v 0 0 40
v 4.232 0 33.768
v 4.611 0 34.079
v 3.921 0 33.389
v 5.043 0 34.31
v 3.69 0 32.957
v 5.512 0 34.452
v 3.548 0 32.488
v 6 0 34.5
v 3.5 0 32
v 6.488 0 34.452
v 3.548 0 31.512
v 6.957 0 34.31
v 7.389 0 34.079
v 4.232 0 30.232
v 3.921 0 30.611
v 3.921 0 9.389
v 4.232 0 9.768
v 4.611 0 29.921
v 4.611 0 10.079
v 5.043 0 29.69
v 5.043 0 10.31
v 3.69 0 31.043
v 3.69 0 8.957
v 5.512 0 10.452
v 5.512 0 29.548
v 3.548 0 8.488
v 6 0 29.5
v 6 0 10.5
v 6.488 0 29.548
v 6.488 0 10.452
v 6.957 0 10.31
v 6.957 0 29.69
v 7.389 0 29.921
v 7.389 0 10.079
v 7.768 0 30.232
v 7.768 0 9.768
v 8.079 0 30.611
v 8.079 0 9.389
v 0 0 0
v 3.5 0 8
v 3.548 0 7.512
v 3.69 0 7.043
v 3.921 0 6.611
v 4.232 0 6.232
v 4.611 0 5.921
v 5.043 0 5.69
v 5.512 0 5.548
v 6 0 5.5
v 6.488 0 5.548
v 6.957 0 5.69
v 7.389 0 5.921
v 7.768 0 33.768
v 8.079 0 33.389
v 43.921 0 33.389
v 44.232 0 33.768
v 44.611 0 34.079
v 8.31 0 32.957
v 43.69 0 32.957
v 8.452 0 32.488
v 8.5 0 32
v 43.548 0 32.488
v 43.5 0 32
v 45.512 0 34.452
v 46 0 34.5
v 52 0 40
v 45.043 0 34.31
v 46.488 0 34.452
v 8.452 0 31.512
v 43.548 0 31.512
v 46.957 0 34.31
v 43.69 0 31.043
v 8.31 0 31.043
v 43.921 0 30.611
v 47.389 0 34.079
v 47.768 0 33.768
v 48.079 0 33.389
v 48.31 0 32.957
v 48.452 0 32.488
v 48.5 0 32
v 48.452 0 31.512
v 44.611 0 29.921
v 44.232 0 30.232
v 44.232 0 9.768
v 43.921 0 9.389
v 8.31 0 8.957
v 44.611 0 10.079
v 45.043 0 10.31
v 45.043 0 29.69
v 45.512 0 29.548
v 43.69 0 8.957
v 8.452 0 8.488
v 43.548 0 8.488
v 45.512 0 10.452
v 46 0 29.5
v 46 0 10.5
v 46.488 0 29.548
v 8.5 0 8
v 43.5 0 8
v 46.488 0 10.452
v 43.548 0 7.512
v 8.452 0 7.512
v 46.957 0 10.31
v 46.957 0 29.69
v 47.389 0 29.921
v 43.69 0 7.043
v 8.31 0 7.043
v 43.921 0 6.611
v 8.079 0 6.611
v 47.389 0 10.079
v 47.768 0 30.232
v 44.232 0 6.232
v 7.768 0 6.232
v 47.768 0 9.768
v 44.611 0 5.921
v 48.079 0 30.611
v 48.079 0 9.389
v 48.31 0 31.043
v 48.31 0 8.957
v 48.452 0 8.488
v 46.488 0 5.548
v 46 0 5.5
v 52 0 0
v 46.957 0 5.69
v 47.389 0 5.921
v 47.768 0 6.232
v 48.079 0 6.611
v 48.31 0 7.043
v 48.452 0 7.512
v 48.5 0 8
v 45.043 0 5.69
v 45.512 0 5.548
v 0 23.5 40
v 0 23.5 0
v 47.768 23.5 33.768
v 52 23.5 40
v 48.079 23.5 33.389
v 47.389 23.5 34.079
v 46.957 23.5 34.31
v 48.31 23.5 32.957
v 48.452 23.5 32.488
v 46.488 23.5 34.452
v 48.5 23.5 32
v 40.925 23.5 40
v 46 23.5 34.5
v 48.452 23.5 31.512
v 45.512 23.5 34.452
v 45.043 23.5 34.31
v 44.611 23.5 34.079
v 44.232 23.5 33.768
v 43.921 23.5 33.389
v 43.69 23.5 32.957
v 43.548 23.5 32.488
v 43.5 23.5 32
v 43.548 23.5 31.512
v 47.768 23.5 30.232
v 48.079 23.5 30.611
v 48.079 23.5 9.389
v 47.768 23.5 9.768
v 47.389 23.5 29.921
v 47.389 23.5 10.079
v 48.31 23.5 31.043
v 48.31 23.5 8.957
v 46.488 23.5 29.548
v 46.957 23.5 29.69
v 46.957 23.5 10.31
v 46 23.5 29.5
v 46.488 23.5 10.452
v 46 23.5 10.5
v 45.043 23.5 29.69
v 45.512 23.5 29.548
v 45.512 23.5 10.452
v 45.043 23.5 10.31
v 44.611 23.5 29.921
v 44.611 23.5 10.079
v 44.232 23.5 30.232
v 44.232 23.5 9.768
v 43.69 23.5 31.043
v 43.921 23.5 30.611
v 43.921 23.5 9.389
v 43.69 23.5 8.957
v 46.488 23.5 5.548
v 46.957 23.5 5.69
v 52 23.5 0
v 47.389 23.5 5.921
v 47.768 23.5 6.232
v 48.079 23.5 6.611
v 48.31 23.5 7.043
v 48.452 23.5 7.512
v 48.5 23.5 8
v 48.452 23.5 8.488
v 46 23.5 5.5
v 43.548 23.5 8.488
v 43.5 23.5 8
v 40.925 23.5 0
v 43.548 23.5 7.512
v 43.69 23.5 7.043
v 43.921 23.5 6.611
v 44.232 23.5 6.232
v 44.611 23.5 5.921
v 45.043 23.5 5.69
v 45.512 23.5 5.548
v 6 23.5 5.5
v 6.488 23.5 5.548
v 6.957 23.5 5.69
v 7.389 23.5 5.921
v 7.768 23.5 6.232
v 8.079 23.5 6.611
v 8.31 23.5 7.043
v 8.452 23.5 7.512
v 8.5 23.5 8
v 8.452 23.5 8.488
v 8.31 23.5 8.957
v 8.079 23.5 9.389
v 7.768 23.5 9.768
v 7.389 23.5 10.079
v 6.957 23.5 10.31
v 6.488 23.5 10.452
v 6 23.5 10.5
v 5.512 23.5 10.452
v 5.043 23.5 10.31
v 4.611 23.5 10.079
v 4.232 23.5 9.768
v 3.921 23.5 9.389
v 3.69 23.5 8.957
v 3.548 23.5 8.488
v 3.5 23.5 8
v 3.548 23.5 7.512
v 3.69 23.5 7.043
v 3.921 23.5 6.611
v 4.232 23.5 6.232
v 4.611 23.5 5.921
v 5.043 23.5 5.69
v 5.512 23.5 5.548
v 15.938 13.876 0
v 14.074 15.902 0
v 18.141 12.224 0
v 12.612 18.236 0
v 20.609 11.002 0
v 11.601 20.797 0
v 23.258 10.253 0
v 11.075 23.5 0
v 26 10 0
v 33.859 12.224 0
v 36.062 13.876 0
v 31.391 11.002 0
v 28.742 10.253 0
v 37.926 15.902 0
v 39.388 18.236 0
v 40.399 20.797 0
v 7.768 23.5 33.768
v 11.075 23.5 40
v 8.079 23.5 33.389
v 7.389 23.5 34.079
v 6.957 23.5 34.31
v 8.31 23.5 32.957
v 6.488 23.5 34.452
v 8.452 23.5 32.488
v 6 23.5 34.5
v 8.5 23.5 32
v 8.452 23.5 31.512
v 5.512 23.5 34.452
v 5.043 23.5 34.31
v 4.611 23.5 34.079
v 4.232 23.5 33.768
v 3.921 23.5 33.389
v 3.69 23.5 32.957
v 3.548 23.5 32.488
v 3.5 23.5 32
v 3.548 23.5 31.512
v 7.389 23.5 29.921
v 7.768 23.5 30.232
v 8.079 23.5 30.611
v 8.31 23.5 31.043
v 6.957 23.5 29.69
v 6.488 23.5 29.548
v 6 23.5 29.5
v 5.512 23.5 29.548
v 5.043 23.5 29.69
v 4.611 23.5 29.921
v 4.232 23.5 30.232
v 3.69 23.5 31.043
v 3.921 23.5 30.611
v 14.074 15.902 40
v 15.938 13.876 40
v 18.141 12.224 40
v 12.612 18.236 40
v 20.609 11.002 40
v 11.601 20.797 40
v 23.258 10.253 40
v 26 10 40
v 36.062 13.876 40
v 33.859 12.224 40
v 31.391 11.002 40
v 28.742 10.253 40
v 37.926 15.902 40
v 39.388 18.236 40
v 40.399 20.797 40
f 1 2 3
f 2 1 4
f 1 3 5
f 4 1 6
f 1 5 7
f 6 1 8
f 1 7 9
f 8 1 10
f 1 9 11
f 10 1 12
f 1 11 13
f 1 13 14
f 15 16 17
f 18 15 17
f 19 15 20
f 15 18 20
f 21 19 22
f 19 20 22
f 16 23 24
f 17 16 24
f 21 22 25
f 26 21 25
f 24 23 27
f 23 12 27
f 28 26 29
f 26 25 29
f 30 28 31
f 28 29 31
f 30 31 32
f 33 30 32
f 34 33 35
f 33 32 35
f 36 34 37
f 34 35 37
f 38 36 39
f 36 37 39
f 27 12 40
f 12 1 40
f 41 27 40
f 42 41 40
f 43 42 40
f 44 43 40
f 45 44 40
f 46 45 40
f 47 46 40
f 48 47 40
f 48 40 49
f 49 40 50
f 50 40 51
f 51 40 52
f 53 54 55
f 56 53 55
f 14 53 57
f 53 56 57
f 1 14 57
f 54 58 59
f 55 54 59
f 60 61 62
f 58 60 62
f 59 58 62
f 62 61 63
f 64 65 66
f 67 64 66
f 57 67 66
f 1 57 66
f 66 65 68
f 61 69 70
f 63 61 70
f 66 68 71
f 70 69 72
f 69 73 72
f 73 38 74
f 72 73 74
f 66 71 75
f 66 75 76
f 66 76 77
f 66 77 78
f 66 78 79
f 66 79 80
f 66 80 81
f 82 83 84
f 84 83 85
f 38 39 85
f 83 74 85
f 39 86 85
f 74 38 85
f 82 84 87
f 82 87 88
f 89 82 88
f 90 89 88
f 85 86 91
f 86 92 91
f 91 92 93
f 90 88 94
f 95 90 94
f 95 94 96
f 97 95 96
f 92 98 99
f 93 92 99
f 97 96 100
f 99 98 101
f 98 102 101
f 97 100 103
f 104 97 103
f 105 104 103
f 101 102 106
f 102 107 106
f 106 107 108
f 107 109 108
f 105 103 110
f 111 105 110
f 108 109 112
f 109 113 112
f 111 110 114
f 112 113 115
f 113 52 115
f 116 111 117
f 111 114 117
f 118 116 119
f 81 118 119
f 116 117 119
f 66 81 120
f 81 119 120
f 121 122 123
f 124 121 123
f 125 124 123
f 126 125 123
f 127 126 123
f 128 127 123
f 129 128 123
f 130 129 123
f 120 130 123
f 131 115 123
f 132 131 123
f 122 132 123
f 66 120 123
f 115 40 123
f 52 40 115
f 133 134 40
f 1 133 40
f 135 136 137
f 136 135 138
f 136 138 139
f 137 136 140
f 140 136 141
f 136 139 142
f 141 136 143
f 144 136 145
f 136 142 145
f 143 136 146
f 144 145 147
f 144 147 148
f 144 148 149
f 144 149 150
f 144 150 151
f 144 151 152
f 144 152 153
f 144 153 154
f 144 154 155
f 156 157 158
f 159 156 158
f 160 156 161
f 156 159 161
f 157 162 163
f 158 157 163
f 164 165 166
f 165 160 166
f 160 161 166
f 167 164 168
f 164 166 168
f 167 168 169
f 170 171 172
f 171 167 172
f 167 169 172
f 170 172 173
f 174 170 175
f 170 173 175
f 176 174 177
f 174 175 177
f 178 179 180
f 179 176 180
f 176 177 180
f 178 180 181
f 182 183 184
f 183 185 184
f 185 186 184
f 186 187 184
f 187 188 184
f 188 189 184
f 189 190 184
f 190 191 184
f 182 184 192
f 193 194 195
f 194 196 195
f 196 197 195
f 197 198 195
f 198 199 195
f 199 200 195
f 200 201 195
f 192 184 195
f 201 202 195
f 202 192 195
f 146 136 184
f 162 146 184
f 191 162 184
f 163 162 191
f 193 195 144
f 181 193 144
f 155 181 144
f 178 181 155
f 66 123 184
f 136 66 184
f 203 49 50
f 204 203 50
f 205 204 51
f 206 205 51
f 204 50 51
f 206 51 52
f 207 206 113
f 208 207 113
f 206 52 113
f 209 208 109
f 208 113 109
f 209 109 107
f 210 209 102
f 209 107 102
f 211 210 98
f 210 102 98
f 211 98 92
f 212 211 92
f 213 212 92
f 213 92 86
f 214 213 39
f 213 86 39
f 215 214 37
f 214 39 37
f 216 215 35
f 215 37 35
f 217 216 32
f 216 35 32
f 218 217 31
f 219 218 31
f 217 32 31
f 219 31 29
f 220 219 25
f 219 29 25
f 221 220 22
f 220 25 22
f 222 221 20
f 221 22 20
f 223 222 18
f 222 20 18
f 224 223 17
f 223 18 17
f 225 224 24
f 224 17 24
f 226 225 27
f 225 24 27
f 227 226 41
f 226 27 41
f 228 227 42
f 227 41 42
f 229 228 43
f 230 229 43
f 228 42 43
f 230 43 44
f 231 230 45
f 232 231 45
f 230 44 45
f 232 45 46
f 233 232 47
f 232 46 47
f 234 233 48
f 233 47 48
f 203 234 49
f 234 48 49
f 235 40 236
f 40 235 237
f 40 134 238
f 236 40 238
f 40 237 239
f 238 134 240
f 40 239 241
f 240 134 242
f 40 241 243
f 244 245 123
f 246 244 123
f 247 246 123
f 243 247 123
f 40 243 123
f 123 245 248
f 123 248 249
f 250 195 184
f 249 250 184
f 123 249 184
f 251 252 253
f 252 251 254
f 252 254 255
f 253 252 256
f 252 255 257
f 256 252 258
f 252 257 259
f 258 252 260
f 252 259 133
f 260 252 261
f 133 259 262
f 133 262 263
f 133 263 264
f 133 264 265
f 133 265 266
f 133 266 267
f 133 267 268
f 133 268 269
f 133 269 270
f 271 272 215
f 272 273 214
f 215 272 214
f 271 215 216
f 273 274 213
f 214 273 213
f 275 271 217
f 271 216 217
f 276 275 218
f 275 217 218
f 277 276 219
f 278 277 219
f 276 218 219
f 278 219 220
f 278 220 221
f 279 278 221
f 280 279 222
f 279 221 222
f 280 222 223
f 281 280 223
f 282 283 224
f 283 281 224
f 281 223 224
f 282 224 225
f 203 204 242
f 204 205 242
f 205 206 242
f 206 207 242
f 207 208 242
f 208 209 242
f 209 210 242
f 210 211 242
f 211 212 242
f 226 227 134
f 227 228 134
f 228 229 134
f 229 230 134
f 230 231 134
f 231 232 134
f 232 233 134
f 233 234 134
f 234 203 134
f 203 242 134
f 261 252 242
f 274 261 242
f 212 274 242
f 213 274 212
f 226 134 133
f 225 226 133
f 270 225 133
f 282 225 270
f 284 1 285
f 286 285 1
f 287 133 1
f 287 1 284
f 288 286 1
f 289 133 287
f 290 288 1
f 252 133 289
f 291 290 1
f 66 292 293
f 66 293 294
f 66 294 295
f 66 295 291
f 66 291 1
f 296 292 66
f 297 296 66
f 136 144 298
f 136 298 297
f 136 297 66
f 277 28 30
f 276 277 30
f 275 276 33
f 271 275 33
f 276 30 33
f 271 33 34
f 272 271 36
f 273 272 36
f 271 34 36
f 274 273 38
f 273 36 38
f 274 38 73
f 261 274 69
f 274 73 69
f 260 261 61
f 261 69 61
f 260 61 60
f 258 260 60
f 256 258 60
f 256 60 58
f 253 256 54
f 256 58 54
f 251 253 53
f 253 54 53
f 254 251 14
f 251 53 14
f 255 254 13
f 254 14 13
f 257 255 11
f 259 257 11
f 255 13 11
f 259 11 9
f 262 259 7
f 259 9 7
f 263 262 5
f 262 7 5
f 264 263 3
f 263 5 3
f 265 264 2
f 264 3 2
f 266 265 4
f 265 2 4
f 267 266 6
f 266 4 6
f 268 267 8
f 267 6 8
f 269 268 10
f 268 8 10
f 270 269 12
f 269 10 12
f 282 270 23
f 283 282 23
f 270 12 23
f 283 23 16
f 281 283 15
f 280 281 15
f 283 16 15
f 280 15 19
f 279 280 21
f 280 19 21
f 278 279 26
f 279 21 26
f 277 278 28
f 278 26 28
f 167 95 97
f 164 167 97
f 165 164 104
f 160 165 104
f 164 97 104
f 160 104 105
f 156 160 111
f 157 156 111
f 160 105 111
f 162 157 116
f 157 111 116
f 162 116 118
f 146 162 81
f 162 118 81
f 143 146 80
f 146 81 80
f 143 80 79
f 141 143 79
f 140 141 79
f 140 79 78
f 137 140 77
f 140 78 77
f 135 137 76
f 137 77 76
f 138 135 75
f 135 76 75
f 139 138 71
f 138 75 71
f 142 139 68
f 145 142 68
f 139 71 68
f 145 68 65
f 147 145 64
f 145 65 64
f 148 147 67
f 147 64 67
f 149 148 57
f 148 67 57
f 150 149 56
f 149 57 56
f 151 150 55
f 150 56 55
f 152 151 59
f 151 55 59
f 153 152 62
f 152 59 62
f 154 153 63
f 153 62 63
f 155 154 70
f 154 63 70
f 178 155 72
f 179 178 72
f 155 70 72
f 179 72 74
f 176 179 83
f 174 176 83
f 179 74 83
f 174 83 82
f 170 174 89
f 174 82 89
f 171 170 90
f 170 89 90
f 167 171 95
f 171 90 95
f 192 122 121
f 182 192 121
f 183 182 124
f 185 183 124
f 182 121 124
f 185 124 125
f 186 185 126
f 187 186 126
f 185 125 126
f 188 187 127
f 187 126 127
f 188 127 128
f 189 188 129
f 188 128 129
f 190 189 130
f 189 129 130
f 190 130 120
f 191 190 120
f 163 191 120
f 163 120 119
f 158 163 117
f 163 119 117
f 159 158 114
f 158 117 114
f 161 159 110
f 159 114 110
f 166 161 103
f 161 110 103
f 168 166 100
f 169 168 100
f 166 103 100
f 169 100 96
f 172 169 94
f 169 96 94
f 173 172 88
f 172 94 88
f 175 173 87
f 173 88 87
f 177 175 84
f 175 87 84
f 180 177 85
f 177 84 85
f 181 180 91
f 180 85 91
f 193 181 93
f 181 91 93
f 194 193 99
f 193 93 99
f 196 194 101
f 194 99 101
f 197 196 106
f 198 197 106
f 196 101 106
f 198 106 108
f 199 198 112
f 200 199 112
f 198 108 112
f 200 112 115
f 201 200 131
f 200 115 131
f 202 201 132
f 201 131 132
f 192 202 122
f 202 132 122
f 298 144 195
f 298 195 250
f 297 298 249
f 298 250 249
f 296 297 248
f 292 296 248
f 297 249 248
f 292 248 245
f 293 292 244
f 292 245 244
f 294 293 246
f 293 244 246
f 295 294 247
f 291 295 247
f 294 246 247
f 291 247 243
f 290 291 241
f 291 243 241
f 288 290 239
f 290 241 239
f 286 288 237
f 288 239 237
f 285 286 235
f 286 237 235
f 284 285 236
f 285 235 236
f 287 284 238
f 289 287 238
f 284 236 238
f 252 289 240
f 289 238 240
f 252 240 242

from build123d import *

# Parameters (mm, degrees)
BOSS_EXTRUDE1_DEPTH = 40
SKETCH2_R           = 2.5
CUT_EXTRUDE1_DEPTH  = 23.5


with BuildPart() as part:
    # Sketch1 → Boss-Extrude1 (new body)
    with BuildSketch(Plane.XY):
        with BuildLine():
            Line((0, 23.5), (0, 0))
            Line((0, 0), (52, 0))
            Line((52, 0), (52, 23.5))
            Line((52, 23.5), (40.924811557, 23.5))
            ThreePointArc((40.924811557, 23.5), (26, 10), (11.075188443, 23.5))
            Line((11.075188443, 23.5), (0, 23.5))
        make_face()
    extrude(amount=BOSS_EXTRUDE1_DEPTH)

    # Sketch2 → Cut-Extrude1 (cut)
    with BuildSketch(Plane(origin=(0, 0, 0), x_dir=(-1, 0, 0), z_dir=(0, -1, 0))):
        with Locations(Location((-6, -8, 0), (0, 0, 90))):
            Circle(SKETCH2_R)
        with Locations(Location((-6, -32, 0), (0, 0, 90))):
            Circle(SKETCH2_R)
        with Locations(Location((-46, -32, 0), (0, 0, 90))):
            Circle(SKETCH2_R)
        with Locations(Location((-46, -8, 0), (0, 0, 90))):
            Circle(SKETCH2_R)
    extrude(amount=-CUT_EXTRUDE1_DEPTH, mode=Mode.SUBTRACT)


solid = part.part
